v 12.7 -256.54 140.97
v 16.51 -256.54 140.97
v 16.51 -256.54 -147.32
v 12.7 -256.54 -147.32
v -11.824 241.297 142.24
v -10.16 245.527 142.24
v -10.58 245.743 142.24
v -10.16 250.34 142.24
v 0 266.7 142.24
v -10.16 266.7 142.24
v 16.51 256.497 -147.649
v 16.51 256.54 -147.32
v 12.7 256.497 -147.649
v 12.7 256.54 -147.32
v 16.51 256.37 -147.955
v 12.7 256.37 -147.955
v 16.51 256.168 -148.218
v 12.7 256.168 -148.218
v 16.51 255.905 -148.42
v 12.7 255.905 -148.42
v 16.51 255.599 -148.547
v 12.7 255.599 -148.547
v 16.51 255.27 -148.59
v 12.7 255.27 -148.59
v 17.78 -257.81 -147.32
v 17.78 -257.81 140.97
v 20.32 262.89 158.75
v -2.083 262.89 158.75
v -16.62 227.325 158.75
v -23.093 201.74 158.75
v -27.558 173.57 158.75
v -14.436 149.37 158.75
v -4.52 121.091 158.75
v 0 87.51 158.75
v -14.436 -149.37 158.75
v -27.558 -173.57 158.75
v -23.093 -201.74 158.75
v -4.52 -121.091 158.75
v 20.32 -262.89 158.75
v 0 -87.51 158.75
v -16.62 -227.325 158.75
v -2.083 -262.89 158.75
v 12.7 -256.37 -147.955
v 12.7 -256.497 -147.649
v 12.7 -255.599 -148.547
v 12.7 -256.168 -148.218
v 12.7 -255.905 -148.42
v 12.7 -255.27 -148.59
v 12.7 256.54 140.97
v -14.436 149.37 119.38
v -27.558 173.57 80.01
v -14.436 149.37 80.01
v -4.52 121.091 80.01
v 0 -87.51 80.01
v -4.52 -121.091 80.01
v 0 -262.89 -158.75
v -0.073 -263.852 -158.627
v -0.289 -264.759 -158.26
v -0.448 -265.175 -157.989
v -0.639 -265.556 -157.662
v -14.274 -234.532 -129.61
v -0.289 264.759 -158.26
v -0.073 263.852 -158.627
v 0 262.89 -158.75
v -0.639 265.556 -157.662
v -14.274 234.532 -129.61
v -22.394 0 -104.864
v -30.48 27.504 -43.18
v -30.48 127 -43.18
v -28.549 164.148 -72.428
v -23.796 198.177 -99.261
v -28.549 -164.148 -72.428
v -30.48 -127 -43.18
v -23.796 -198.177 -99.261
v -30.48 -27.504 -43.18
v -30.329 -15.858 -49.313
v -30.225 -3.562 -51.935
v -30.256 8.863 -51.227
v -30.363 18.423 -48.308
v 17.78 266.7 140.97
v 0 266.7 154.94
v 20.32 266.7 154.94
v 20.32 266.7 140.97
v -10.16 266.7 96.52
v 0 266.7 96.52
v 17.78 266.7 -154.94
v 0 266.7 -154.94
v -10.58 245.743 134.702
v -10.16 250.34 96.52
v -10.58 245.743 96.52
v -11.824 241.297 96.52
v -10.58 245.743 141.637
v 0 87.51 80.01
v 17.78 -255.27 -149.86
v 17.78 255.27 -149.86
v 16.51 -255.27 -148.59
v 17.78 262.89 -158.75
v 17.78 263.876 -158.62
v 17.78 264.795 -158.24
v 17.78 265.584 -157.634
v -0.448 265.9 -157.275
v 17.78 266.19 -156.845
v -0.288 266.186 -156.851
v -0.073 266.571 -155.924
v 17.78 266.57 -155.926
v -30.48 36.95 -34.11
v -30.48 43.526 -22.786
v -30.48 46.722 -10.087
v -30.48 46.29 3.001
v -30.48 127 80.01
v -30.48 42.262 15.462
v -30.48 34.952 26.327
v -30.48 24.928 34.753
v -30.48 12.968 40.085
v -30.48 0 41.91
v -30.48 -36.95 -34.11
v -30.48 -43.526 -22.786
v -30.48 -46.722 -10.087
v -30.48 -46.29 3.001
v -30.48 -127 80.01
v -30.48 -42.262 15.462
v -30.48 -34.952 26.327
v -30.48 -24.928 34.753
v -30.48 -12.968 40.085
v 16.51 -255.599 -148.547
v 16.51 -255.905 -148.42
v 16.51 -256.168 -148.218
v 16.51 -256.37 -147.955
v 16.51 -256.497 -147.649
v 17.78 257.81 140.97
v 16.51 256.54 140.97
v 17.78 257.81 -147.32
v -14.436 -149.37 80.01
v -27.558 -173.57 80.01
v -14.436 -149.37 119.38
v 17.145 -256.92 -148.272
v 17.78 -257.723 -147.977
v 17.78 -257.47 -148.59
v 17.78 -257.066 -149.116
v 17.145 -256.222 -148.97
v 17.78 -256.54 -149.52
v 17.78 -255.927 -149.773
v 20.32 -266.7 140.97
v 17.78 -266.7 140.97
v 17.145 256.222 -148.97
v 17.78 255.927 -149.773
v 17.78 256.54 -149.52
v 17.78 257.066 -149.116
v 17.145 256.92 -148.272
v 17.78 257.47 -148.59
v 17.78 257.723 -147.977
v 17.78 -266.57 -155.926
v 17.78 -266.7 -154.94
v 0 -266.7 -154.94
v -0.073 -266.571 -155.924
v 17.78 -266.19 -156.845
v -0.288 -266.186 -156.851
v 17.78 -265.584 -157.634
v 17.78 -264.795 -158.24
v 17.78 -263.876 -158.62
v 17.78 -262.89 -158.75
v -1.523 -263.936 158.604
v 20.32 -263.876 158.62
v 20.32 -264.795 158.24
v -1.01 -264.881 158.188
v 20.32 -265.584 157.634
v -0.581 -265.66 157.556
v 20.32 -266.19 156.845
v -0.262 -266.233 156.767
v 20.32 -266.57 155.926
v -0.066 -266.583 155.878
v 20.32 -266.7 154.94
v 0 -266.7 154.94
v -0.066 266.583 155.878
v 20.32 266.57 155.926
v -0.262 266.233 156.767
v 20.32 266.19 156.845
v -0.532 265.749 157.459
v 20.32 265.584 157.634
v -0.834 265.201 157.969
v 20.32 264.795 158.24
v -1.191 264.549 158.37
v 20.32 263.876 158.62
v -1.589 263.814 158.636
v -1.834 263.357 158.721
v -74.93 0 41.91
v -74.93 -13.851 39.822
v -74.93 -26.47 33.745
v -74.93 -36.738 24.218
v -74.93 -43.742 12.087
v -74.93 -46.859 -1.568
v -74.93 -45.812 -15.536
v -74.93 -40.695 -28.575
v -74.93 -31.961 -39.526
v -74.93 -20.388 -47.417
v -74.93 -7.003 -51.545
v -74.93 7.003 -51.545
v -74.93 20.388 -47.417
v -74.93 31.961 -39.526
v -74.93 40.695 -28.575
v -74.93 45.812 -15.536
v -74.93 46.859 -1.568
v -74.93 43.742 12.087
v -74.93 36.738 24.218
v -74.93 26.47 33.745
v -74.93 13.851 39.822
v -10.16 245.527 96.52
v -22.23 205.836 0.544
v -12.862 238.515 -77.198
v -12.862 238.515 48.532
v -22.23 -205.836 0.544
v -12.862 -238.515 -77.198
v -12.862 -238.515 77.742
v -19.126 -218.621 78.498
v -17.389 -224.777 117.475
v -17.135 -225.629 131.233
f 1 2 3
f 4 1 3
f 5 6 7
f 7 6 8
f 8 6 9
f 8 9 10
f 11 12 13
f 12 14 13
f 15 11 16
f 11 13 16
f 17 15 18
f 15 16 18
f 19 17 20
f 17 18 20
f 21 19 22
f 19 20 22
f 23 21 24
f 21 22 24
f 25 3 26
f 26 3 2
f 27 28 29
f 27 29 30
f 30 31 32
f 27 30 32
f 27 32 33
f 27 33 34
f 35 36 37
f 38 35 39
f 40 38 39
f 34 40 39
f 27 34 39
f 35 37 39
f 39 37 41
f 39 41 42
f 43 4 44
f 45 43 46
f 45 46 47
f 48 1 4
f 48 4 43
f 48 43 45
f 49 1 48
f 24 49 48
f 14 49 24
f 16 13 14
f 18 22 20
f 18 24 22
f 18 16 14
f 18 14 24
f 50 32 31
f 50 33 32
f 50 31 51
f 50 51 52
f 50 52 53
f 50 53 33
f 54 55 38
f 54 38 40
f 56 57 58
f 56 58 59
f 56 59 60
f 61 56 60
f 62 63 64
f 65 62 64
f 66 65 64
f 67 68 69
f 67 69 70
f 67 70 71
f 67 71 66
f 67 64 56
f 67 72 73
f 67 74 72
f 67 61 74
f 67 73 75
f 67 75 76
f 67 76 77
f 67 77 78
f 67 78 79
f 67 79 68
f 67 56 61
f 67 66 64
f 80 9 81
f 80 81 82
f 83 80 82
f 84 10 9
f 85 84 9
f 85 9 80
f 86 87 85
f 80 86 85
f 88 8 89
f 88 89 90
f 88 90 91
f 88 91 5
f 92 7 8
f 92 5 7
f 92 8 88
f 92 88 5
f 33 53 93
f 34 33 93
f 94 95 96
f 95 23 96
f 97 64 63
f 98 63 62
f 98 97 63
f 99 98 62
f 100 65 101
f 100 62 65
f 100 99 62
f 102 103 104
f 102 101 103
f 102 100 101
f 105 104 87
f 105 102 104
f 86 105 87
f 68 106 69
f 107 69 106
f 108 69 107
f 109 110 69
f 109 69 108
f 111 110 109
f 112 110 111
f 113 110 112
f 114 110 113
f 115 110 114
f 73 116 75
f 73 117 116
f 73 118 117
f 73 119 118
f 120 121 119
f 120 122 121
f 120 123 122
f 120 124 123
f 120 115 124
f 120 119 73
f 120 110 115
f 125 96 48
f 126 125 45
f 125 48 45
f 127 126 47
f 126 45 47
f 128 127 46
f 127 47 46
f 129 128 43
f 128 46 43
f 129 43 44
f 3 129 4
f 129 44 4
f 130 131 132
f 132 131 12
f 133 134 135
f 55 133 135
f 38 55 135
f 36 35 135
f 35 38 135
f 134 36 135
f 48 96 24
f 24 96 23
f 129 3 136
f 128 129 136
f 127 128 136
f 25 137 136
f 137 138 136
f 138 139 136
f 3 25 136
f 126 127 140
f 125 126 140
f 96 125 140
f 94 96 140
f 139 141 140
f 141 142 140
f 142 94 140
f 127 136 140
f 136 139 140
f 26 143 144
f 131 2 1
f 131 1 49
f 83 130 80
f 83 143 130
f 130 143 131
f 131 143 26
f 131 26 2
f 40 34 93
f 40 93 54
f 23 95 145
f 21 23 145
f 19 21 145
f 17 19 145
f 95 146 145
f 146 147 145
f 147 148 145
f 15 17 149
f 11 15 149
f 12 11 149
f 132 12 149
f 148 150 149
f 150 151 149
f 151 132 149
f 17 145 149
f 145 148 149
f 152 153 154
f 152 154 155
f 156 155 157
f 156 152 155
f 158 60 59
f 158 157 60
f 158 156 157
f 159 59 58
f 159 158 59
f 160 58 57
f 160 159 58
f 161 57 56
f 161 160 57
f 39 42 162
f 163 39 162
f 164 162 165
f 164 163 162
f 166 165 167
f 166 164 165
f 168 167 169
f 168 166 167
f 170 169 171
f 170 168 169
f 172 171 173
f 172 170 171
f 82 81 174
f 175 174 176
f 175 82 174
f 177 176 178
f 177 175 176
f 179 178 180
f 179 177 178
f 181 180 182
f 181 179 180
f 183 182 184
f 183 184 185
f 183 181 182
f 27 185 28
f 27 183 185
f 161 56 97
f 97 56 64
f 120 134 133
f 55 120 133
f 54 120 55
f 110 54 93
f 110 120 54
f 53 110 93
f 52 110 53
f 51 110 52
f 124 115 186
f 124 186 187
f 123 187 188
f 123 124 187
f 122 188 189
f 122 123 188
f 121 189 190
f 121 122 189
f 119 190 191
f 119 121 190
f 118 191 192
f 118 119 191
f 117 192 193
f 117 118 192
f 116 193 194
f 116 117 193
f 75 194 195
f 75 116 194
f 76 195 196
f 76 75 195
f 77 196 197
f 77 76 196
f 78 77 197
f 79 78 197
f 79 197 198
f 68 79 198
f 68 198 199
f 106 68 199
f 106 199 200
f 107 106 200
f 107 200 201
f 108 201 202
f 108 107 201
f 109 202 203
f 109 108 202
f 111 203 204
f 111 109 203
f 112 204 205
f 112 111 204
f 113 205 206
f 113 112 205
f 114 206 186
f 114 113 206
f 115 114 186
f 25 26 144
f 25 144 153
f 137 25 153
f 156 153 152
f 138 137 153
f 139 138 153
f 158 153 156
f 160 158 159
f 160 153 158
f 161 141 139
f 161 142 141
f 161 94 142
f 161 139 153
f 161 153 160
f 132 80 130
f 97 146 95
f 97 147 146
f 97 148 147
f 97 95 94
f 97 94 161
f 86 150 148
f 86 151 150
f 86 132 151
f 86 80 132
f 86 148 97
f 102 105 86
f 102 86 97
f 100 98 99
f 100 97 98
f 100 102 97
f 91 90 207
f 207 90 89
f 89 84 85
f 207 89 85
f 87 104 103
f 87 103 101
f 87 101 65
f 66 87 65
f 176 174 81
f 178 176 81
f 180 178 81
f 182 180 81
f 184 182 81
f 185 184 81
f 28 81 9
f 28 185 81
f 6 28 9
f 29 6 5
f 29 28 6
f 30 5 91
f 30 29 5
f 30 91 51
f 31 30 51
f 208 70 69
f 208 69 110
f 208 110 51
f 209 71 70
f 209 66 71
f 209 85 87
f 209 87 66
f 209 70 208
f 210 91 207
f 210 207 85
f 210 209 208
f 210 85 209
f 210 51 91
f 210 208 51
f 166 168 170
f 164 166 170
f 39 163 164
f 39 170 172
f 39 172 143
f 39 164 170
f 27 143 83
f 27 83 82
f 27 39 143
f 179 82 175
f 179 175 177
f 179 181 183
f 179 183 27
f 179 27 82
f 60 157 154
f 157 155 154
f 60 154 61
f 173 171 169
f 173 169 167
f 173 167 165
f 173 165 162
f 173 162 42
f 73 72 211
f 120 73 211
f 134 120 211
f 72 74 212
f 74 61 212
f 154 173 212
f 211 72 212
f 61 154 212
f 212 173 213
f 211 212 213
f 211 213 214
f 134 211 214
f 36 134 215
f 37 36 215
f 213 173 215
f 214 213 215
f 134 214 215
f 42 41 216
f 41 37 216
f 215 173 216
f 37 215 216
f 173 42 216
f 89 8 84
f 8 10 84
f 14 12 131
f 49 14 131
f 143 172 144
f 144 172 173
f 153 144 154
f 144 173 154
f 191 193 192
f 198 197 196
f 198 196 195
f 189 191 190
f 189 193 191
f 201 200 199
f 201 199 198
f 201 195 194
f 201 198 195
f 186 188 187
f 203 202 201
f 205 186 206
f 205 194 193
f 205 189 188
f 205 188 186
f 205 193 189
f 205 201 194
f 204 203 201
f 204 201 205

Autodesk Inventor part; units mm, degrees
ref_plane "YZ Plane" through (0, 0, 0) normal (1, 0, 0) x (0, 1, 0)
ref_plane "XZ Plane" through (0, 0, 0) normal (0, 1, 0) x (-1, 0, 0)
ref_plane "XY Plane" through (0, 0, 0) normal (0, 0, 1) x (1, 0, 0)
sketch "Sketch1" plane through (0, 0, 0) normal (1, 0, 0) x (0, 1, 0)
  line L0 (266.7, 158.75) -> (-266.7, 158.75)
  line L1 (-266.7, 158.75) -> (-266.7, -158.75)
  line L2 (-266.7, -158.75) -> (266.7, -158.75)
  line L3 (266.7, -158.75) -> (266.7, 158.75)
  line L4 (266.7, 158.75) -> (-266.7, -158.75) construction
  line L5 (-266.7, 158.75) -> (266.7, -158.75) construction
  point P0 (0, 0)
  dimension "d0" = 533.4
  dimension "d1" = 317.5
extrude "Extrusion1" add sketch "Sketch1" along normal blind 20.32
sketch "Sketch2" plane through (20.32, 0, 0) normal (1, 0, 0) x (0, 0, -1)
  line L0 (-158.75, 266.7) -> (-158.75, -266.7) projected
  line L1 (158.75, 266.7) -> (-158.75, 266.7) projected
  line L2 (-158.75, -266.7) -> (-140.97, -266.7)
  line L3 (-140.97, -266.7) -> (-140.97, 266.7)
  line L4 (-140.97, 266.7) -> (-158.75, 266.7)
  line L5 (-158.75, 266.7) -> (-158.75, -266.7)
  line L6 (158.75, 266.7) -> (-140.97, 266.7)
  line L7 (-140.97, 266.7) -> (-140.97, -266.7)
  line L8 (-140.97, -266.7) -> (158.75, -266.7)
  line L9 (158.75, -266.7) -> (158.75, 266.7)
  point P0 (0, 0)
  dimension "d4" = 17.78
extrude "Extrusion2" cut sketch "Sketch2" against normal blind 2.54 contours L1 L9 L8 L3
sketch "Sketch3" plane through (17.78, 0, 0) normal (1, 0, 0) x (0, 0, -1)
  line L0 (-140.97, -266.7) -> (-140.97, 266.7) projected
  line L1 (-140.97, 266.7) -> (-140.97, 256.54)
  line L2 (-140.97, -266.7) -> (-140.97, -256.54)
  line L3 (158.75, -266.7) -> (158.75, 266.7) projected
  line L4 (158.75, 0) -> (148.59, 0)
  line L5 (-140.97, -256.54) -> (148.59, -256.54)
  line L6 (148.59, -256.54) -> (148.59, 256.54)
  line L7 (148.59, 256.54) -> (-140.97, 256.54)
  line L8 (-140.97, 256.54) -> (-140.97, -256.54)
  point P0 (0, 0)
  dimension "d7" = 10.16
  dimension "d8" = 10.16
  dimension "d9" = 10.16
extrude "Extrusion3" cut sketch "Sketch3" against normal blind 5.08
sketch "Sketch4" plane through (0, -266.7, 158.75) normal (0, 0, 1) x (1, 0, 0)
  line L0 (0, 266.7) -> (-30.48, 266.7)
  line L1 (-30.48, 266.7) -> (-30.48, 393.7)
  line L2 (-30.48, 266.7) -> (-30.48, 139.7)
  line L3 (0, 0) -> (20.32, 0) projected
  spline S0 degree 2 poles (0, 0) (-29.2196, 51.877) (-30.48, 139.7) knots 0 0 0 1 1 1
  spline S1 degree 2 poles (0, 533.4) (-29.2196, 481.523) (-30.48, 393.7) knots 0 0 0 1 1 1
  line L4 (0, 0) -> (0, 533.4)
  line L5 (20.32, 533.4) -> (20.32, 0) projected
  point P0 (-20.6375, 53.975)
  point P1 (-20.6375, 479.425)
  dimension "d12" = 30.48
  dimension "d13" = 127
  dimension "d14" = 127
extrude "Extrusion4" add sketch "Sketch4" against normal blind 317.5
sketch "Sketch5" plane through (17.78, 266.7, 140.97) normal (0, 1, 0) x (1, 0, 0)
  line L0 (-17.78, 299.72) -> (0, 299.72) projected
  line L1 (-48.26, -17.78) -> (-48.26, 299.72) projected
  spline S0 degree 2 poles (-17.78, 299.72) (-47.3289, 249.7338) (-48.26, 184.15) knots 0 0 0 1 1 1
  line L2 (-48.26, 184.15) -> (-48.26, 299.72)
  line L3 (-48.26, 299.72) -> (-17.78, 299.72)
  point P0 (-17.78, 140.97)
  point P1 (-39.6875, 247.65)
extrude "Extrusion5" cut sketch "Sketch5" against normal blind 533.4
fillet "Fillet1" radius 3.81 4 edges at (8.89, 266.7, -158.75) (8.89, -266.7, -158.75) (10.16, -266.7, 158.75) (10.16, 266.7, 158.75)
fillet "Fillet2" radius 1.27 2 edges at (15.24, -256.54, -148.59) (15.24, 256.54, -148.59)
chamfer "Chamfer1" distance 1.27 angle 45 5 edges at (17.78, 256.54, -3.175) (17.78, 256.168, -148.218) (17.78, 0, -148.59) (17.78, -256.168, -148.218) (17.78, -256.54, -3.175)
sketch "Sketch6" plane through (-30.48, -127, 158.75) normal (0, 0, 1) x (1, 0, 0)
  line L0 (0, 0) -> (0, 254) projected
  line L1 (0, 127) -> (30.48, 127)
  line L2 (30.48, 127) -> (30.48, 228.6)
  line L3 (30.48, 127) -> (30.48, 25.4)
  line L4 (0, 127) -> (0, 304.8)
  line L5 (0, 127) -> (0, -50.8)
  spline S0 degree 2 poles (0, -50.8) (21.577, -20.7599) (30.48, 25.4) knots 0 0 0 1 1 1
  spline S1 degree 2 poles (0, 304.8) (21.577, 274.7599) (30.48, 228.6) knots 0 0 0 1 1 1
  point P0 (17.4625, -19.05)
  point P1 (17.4625, 273.05)
  dimension "d24" = 101.6
  dimension "d25" = 101.6
  dimension "d26" = 177.8
  dimension "d27" = 177.8
extrude "Extrusion6" cut sketch "Sketch6" against normal blind 78.74
fillet "Fillet3" radius 127 2 edges at (0, -101.6, 119.38) (0, 101.6, 119.38)
sketch "Sketch7" plane through (0, 266.7, 154.94) normal (0, 1, 0) x (1, 0, 0)
  line L0 (-2.0826, -3.81) -> (20.32, -3.81) projected
  line L1 (0, -3.81) -> (0, 12.7)
  line L2 (0, 12.7) -> (-10.16, 12.7)
  line L3 (-10.16, 12.7) -> (-10.16, 58.42)
  line L4 (-10.16, 58.42) -> (0, 58.42)
  line L5 (0, 58.42) -> (0, 12.7)
  point P0 (0, 154.94)
  dimension "d31" = 16.51
  dimension "d32" = 10.16
  dimension "d33" = 45.72
extrude "Extrusion7" add sketch "Sketch7" against normal blind 65.7225
fillet "Fillet4" radius 25.4 1 edges at (-10.16, 245.5271, 120.309)
sketch "Sketch8" plane through (-30.48, -127, -43.18) normal (-1, 0, 0) x (0, 0, 1)
  line L0 (123.19, 214.5104) -> (123.19, 39.4896) projected
  line L1 (123.19, 127) -> (85.09, 127)
  line L2 (85.09, 127) -> (38.1, 127)
  circle A0 centre (38.1, 127) radius 46.99
  point P0 (43.18, 127)
  dimension "d37" = 38.1
  dimension "d38" = 46.99
  dimension "d39" = 93.98
extrude "Extrusion8" add sketch "Sketch8" against normal blind 7.9375
extrude "Extrusion9" add sketch "Sketch8" along normal blind 44.45
properties part number "DellP2317H" material "ABS Plastic"
